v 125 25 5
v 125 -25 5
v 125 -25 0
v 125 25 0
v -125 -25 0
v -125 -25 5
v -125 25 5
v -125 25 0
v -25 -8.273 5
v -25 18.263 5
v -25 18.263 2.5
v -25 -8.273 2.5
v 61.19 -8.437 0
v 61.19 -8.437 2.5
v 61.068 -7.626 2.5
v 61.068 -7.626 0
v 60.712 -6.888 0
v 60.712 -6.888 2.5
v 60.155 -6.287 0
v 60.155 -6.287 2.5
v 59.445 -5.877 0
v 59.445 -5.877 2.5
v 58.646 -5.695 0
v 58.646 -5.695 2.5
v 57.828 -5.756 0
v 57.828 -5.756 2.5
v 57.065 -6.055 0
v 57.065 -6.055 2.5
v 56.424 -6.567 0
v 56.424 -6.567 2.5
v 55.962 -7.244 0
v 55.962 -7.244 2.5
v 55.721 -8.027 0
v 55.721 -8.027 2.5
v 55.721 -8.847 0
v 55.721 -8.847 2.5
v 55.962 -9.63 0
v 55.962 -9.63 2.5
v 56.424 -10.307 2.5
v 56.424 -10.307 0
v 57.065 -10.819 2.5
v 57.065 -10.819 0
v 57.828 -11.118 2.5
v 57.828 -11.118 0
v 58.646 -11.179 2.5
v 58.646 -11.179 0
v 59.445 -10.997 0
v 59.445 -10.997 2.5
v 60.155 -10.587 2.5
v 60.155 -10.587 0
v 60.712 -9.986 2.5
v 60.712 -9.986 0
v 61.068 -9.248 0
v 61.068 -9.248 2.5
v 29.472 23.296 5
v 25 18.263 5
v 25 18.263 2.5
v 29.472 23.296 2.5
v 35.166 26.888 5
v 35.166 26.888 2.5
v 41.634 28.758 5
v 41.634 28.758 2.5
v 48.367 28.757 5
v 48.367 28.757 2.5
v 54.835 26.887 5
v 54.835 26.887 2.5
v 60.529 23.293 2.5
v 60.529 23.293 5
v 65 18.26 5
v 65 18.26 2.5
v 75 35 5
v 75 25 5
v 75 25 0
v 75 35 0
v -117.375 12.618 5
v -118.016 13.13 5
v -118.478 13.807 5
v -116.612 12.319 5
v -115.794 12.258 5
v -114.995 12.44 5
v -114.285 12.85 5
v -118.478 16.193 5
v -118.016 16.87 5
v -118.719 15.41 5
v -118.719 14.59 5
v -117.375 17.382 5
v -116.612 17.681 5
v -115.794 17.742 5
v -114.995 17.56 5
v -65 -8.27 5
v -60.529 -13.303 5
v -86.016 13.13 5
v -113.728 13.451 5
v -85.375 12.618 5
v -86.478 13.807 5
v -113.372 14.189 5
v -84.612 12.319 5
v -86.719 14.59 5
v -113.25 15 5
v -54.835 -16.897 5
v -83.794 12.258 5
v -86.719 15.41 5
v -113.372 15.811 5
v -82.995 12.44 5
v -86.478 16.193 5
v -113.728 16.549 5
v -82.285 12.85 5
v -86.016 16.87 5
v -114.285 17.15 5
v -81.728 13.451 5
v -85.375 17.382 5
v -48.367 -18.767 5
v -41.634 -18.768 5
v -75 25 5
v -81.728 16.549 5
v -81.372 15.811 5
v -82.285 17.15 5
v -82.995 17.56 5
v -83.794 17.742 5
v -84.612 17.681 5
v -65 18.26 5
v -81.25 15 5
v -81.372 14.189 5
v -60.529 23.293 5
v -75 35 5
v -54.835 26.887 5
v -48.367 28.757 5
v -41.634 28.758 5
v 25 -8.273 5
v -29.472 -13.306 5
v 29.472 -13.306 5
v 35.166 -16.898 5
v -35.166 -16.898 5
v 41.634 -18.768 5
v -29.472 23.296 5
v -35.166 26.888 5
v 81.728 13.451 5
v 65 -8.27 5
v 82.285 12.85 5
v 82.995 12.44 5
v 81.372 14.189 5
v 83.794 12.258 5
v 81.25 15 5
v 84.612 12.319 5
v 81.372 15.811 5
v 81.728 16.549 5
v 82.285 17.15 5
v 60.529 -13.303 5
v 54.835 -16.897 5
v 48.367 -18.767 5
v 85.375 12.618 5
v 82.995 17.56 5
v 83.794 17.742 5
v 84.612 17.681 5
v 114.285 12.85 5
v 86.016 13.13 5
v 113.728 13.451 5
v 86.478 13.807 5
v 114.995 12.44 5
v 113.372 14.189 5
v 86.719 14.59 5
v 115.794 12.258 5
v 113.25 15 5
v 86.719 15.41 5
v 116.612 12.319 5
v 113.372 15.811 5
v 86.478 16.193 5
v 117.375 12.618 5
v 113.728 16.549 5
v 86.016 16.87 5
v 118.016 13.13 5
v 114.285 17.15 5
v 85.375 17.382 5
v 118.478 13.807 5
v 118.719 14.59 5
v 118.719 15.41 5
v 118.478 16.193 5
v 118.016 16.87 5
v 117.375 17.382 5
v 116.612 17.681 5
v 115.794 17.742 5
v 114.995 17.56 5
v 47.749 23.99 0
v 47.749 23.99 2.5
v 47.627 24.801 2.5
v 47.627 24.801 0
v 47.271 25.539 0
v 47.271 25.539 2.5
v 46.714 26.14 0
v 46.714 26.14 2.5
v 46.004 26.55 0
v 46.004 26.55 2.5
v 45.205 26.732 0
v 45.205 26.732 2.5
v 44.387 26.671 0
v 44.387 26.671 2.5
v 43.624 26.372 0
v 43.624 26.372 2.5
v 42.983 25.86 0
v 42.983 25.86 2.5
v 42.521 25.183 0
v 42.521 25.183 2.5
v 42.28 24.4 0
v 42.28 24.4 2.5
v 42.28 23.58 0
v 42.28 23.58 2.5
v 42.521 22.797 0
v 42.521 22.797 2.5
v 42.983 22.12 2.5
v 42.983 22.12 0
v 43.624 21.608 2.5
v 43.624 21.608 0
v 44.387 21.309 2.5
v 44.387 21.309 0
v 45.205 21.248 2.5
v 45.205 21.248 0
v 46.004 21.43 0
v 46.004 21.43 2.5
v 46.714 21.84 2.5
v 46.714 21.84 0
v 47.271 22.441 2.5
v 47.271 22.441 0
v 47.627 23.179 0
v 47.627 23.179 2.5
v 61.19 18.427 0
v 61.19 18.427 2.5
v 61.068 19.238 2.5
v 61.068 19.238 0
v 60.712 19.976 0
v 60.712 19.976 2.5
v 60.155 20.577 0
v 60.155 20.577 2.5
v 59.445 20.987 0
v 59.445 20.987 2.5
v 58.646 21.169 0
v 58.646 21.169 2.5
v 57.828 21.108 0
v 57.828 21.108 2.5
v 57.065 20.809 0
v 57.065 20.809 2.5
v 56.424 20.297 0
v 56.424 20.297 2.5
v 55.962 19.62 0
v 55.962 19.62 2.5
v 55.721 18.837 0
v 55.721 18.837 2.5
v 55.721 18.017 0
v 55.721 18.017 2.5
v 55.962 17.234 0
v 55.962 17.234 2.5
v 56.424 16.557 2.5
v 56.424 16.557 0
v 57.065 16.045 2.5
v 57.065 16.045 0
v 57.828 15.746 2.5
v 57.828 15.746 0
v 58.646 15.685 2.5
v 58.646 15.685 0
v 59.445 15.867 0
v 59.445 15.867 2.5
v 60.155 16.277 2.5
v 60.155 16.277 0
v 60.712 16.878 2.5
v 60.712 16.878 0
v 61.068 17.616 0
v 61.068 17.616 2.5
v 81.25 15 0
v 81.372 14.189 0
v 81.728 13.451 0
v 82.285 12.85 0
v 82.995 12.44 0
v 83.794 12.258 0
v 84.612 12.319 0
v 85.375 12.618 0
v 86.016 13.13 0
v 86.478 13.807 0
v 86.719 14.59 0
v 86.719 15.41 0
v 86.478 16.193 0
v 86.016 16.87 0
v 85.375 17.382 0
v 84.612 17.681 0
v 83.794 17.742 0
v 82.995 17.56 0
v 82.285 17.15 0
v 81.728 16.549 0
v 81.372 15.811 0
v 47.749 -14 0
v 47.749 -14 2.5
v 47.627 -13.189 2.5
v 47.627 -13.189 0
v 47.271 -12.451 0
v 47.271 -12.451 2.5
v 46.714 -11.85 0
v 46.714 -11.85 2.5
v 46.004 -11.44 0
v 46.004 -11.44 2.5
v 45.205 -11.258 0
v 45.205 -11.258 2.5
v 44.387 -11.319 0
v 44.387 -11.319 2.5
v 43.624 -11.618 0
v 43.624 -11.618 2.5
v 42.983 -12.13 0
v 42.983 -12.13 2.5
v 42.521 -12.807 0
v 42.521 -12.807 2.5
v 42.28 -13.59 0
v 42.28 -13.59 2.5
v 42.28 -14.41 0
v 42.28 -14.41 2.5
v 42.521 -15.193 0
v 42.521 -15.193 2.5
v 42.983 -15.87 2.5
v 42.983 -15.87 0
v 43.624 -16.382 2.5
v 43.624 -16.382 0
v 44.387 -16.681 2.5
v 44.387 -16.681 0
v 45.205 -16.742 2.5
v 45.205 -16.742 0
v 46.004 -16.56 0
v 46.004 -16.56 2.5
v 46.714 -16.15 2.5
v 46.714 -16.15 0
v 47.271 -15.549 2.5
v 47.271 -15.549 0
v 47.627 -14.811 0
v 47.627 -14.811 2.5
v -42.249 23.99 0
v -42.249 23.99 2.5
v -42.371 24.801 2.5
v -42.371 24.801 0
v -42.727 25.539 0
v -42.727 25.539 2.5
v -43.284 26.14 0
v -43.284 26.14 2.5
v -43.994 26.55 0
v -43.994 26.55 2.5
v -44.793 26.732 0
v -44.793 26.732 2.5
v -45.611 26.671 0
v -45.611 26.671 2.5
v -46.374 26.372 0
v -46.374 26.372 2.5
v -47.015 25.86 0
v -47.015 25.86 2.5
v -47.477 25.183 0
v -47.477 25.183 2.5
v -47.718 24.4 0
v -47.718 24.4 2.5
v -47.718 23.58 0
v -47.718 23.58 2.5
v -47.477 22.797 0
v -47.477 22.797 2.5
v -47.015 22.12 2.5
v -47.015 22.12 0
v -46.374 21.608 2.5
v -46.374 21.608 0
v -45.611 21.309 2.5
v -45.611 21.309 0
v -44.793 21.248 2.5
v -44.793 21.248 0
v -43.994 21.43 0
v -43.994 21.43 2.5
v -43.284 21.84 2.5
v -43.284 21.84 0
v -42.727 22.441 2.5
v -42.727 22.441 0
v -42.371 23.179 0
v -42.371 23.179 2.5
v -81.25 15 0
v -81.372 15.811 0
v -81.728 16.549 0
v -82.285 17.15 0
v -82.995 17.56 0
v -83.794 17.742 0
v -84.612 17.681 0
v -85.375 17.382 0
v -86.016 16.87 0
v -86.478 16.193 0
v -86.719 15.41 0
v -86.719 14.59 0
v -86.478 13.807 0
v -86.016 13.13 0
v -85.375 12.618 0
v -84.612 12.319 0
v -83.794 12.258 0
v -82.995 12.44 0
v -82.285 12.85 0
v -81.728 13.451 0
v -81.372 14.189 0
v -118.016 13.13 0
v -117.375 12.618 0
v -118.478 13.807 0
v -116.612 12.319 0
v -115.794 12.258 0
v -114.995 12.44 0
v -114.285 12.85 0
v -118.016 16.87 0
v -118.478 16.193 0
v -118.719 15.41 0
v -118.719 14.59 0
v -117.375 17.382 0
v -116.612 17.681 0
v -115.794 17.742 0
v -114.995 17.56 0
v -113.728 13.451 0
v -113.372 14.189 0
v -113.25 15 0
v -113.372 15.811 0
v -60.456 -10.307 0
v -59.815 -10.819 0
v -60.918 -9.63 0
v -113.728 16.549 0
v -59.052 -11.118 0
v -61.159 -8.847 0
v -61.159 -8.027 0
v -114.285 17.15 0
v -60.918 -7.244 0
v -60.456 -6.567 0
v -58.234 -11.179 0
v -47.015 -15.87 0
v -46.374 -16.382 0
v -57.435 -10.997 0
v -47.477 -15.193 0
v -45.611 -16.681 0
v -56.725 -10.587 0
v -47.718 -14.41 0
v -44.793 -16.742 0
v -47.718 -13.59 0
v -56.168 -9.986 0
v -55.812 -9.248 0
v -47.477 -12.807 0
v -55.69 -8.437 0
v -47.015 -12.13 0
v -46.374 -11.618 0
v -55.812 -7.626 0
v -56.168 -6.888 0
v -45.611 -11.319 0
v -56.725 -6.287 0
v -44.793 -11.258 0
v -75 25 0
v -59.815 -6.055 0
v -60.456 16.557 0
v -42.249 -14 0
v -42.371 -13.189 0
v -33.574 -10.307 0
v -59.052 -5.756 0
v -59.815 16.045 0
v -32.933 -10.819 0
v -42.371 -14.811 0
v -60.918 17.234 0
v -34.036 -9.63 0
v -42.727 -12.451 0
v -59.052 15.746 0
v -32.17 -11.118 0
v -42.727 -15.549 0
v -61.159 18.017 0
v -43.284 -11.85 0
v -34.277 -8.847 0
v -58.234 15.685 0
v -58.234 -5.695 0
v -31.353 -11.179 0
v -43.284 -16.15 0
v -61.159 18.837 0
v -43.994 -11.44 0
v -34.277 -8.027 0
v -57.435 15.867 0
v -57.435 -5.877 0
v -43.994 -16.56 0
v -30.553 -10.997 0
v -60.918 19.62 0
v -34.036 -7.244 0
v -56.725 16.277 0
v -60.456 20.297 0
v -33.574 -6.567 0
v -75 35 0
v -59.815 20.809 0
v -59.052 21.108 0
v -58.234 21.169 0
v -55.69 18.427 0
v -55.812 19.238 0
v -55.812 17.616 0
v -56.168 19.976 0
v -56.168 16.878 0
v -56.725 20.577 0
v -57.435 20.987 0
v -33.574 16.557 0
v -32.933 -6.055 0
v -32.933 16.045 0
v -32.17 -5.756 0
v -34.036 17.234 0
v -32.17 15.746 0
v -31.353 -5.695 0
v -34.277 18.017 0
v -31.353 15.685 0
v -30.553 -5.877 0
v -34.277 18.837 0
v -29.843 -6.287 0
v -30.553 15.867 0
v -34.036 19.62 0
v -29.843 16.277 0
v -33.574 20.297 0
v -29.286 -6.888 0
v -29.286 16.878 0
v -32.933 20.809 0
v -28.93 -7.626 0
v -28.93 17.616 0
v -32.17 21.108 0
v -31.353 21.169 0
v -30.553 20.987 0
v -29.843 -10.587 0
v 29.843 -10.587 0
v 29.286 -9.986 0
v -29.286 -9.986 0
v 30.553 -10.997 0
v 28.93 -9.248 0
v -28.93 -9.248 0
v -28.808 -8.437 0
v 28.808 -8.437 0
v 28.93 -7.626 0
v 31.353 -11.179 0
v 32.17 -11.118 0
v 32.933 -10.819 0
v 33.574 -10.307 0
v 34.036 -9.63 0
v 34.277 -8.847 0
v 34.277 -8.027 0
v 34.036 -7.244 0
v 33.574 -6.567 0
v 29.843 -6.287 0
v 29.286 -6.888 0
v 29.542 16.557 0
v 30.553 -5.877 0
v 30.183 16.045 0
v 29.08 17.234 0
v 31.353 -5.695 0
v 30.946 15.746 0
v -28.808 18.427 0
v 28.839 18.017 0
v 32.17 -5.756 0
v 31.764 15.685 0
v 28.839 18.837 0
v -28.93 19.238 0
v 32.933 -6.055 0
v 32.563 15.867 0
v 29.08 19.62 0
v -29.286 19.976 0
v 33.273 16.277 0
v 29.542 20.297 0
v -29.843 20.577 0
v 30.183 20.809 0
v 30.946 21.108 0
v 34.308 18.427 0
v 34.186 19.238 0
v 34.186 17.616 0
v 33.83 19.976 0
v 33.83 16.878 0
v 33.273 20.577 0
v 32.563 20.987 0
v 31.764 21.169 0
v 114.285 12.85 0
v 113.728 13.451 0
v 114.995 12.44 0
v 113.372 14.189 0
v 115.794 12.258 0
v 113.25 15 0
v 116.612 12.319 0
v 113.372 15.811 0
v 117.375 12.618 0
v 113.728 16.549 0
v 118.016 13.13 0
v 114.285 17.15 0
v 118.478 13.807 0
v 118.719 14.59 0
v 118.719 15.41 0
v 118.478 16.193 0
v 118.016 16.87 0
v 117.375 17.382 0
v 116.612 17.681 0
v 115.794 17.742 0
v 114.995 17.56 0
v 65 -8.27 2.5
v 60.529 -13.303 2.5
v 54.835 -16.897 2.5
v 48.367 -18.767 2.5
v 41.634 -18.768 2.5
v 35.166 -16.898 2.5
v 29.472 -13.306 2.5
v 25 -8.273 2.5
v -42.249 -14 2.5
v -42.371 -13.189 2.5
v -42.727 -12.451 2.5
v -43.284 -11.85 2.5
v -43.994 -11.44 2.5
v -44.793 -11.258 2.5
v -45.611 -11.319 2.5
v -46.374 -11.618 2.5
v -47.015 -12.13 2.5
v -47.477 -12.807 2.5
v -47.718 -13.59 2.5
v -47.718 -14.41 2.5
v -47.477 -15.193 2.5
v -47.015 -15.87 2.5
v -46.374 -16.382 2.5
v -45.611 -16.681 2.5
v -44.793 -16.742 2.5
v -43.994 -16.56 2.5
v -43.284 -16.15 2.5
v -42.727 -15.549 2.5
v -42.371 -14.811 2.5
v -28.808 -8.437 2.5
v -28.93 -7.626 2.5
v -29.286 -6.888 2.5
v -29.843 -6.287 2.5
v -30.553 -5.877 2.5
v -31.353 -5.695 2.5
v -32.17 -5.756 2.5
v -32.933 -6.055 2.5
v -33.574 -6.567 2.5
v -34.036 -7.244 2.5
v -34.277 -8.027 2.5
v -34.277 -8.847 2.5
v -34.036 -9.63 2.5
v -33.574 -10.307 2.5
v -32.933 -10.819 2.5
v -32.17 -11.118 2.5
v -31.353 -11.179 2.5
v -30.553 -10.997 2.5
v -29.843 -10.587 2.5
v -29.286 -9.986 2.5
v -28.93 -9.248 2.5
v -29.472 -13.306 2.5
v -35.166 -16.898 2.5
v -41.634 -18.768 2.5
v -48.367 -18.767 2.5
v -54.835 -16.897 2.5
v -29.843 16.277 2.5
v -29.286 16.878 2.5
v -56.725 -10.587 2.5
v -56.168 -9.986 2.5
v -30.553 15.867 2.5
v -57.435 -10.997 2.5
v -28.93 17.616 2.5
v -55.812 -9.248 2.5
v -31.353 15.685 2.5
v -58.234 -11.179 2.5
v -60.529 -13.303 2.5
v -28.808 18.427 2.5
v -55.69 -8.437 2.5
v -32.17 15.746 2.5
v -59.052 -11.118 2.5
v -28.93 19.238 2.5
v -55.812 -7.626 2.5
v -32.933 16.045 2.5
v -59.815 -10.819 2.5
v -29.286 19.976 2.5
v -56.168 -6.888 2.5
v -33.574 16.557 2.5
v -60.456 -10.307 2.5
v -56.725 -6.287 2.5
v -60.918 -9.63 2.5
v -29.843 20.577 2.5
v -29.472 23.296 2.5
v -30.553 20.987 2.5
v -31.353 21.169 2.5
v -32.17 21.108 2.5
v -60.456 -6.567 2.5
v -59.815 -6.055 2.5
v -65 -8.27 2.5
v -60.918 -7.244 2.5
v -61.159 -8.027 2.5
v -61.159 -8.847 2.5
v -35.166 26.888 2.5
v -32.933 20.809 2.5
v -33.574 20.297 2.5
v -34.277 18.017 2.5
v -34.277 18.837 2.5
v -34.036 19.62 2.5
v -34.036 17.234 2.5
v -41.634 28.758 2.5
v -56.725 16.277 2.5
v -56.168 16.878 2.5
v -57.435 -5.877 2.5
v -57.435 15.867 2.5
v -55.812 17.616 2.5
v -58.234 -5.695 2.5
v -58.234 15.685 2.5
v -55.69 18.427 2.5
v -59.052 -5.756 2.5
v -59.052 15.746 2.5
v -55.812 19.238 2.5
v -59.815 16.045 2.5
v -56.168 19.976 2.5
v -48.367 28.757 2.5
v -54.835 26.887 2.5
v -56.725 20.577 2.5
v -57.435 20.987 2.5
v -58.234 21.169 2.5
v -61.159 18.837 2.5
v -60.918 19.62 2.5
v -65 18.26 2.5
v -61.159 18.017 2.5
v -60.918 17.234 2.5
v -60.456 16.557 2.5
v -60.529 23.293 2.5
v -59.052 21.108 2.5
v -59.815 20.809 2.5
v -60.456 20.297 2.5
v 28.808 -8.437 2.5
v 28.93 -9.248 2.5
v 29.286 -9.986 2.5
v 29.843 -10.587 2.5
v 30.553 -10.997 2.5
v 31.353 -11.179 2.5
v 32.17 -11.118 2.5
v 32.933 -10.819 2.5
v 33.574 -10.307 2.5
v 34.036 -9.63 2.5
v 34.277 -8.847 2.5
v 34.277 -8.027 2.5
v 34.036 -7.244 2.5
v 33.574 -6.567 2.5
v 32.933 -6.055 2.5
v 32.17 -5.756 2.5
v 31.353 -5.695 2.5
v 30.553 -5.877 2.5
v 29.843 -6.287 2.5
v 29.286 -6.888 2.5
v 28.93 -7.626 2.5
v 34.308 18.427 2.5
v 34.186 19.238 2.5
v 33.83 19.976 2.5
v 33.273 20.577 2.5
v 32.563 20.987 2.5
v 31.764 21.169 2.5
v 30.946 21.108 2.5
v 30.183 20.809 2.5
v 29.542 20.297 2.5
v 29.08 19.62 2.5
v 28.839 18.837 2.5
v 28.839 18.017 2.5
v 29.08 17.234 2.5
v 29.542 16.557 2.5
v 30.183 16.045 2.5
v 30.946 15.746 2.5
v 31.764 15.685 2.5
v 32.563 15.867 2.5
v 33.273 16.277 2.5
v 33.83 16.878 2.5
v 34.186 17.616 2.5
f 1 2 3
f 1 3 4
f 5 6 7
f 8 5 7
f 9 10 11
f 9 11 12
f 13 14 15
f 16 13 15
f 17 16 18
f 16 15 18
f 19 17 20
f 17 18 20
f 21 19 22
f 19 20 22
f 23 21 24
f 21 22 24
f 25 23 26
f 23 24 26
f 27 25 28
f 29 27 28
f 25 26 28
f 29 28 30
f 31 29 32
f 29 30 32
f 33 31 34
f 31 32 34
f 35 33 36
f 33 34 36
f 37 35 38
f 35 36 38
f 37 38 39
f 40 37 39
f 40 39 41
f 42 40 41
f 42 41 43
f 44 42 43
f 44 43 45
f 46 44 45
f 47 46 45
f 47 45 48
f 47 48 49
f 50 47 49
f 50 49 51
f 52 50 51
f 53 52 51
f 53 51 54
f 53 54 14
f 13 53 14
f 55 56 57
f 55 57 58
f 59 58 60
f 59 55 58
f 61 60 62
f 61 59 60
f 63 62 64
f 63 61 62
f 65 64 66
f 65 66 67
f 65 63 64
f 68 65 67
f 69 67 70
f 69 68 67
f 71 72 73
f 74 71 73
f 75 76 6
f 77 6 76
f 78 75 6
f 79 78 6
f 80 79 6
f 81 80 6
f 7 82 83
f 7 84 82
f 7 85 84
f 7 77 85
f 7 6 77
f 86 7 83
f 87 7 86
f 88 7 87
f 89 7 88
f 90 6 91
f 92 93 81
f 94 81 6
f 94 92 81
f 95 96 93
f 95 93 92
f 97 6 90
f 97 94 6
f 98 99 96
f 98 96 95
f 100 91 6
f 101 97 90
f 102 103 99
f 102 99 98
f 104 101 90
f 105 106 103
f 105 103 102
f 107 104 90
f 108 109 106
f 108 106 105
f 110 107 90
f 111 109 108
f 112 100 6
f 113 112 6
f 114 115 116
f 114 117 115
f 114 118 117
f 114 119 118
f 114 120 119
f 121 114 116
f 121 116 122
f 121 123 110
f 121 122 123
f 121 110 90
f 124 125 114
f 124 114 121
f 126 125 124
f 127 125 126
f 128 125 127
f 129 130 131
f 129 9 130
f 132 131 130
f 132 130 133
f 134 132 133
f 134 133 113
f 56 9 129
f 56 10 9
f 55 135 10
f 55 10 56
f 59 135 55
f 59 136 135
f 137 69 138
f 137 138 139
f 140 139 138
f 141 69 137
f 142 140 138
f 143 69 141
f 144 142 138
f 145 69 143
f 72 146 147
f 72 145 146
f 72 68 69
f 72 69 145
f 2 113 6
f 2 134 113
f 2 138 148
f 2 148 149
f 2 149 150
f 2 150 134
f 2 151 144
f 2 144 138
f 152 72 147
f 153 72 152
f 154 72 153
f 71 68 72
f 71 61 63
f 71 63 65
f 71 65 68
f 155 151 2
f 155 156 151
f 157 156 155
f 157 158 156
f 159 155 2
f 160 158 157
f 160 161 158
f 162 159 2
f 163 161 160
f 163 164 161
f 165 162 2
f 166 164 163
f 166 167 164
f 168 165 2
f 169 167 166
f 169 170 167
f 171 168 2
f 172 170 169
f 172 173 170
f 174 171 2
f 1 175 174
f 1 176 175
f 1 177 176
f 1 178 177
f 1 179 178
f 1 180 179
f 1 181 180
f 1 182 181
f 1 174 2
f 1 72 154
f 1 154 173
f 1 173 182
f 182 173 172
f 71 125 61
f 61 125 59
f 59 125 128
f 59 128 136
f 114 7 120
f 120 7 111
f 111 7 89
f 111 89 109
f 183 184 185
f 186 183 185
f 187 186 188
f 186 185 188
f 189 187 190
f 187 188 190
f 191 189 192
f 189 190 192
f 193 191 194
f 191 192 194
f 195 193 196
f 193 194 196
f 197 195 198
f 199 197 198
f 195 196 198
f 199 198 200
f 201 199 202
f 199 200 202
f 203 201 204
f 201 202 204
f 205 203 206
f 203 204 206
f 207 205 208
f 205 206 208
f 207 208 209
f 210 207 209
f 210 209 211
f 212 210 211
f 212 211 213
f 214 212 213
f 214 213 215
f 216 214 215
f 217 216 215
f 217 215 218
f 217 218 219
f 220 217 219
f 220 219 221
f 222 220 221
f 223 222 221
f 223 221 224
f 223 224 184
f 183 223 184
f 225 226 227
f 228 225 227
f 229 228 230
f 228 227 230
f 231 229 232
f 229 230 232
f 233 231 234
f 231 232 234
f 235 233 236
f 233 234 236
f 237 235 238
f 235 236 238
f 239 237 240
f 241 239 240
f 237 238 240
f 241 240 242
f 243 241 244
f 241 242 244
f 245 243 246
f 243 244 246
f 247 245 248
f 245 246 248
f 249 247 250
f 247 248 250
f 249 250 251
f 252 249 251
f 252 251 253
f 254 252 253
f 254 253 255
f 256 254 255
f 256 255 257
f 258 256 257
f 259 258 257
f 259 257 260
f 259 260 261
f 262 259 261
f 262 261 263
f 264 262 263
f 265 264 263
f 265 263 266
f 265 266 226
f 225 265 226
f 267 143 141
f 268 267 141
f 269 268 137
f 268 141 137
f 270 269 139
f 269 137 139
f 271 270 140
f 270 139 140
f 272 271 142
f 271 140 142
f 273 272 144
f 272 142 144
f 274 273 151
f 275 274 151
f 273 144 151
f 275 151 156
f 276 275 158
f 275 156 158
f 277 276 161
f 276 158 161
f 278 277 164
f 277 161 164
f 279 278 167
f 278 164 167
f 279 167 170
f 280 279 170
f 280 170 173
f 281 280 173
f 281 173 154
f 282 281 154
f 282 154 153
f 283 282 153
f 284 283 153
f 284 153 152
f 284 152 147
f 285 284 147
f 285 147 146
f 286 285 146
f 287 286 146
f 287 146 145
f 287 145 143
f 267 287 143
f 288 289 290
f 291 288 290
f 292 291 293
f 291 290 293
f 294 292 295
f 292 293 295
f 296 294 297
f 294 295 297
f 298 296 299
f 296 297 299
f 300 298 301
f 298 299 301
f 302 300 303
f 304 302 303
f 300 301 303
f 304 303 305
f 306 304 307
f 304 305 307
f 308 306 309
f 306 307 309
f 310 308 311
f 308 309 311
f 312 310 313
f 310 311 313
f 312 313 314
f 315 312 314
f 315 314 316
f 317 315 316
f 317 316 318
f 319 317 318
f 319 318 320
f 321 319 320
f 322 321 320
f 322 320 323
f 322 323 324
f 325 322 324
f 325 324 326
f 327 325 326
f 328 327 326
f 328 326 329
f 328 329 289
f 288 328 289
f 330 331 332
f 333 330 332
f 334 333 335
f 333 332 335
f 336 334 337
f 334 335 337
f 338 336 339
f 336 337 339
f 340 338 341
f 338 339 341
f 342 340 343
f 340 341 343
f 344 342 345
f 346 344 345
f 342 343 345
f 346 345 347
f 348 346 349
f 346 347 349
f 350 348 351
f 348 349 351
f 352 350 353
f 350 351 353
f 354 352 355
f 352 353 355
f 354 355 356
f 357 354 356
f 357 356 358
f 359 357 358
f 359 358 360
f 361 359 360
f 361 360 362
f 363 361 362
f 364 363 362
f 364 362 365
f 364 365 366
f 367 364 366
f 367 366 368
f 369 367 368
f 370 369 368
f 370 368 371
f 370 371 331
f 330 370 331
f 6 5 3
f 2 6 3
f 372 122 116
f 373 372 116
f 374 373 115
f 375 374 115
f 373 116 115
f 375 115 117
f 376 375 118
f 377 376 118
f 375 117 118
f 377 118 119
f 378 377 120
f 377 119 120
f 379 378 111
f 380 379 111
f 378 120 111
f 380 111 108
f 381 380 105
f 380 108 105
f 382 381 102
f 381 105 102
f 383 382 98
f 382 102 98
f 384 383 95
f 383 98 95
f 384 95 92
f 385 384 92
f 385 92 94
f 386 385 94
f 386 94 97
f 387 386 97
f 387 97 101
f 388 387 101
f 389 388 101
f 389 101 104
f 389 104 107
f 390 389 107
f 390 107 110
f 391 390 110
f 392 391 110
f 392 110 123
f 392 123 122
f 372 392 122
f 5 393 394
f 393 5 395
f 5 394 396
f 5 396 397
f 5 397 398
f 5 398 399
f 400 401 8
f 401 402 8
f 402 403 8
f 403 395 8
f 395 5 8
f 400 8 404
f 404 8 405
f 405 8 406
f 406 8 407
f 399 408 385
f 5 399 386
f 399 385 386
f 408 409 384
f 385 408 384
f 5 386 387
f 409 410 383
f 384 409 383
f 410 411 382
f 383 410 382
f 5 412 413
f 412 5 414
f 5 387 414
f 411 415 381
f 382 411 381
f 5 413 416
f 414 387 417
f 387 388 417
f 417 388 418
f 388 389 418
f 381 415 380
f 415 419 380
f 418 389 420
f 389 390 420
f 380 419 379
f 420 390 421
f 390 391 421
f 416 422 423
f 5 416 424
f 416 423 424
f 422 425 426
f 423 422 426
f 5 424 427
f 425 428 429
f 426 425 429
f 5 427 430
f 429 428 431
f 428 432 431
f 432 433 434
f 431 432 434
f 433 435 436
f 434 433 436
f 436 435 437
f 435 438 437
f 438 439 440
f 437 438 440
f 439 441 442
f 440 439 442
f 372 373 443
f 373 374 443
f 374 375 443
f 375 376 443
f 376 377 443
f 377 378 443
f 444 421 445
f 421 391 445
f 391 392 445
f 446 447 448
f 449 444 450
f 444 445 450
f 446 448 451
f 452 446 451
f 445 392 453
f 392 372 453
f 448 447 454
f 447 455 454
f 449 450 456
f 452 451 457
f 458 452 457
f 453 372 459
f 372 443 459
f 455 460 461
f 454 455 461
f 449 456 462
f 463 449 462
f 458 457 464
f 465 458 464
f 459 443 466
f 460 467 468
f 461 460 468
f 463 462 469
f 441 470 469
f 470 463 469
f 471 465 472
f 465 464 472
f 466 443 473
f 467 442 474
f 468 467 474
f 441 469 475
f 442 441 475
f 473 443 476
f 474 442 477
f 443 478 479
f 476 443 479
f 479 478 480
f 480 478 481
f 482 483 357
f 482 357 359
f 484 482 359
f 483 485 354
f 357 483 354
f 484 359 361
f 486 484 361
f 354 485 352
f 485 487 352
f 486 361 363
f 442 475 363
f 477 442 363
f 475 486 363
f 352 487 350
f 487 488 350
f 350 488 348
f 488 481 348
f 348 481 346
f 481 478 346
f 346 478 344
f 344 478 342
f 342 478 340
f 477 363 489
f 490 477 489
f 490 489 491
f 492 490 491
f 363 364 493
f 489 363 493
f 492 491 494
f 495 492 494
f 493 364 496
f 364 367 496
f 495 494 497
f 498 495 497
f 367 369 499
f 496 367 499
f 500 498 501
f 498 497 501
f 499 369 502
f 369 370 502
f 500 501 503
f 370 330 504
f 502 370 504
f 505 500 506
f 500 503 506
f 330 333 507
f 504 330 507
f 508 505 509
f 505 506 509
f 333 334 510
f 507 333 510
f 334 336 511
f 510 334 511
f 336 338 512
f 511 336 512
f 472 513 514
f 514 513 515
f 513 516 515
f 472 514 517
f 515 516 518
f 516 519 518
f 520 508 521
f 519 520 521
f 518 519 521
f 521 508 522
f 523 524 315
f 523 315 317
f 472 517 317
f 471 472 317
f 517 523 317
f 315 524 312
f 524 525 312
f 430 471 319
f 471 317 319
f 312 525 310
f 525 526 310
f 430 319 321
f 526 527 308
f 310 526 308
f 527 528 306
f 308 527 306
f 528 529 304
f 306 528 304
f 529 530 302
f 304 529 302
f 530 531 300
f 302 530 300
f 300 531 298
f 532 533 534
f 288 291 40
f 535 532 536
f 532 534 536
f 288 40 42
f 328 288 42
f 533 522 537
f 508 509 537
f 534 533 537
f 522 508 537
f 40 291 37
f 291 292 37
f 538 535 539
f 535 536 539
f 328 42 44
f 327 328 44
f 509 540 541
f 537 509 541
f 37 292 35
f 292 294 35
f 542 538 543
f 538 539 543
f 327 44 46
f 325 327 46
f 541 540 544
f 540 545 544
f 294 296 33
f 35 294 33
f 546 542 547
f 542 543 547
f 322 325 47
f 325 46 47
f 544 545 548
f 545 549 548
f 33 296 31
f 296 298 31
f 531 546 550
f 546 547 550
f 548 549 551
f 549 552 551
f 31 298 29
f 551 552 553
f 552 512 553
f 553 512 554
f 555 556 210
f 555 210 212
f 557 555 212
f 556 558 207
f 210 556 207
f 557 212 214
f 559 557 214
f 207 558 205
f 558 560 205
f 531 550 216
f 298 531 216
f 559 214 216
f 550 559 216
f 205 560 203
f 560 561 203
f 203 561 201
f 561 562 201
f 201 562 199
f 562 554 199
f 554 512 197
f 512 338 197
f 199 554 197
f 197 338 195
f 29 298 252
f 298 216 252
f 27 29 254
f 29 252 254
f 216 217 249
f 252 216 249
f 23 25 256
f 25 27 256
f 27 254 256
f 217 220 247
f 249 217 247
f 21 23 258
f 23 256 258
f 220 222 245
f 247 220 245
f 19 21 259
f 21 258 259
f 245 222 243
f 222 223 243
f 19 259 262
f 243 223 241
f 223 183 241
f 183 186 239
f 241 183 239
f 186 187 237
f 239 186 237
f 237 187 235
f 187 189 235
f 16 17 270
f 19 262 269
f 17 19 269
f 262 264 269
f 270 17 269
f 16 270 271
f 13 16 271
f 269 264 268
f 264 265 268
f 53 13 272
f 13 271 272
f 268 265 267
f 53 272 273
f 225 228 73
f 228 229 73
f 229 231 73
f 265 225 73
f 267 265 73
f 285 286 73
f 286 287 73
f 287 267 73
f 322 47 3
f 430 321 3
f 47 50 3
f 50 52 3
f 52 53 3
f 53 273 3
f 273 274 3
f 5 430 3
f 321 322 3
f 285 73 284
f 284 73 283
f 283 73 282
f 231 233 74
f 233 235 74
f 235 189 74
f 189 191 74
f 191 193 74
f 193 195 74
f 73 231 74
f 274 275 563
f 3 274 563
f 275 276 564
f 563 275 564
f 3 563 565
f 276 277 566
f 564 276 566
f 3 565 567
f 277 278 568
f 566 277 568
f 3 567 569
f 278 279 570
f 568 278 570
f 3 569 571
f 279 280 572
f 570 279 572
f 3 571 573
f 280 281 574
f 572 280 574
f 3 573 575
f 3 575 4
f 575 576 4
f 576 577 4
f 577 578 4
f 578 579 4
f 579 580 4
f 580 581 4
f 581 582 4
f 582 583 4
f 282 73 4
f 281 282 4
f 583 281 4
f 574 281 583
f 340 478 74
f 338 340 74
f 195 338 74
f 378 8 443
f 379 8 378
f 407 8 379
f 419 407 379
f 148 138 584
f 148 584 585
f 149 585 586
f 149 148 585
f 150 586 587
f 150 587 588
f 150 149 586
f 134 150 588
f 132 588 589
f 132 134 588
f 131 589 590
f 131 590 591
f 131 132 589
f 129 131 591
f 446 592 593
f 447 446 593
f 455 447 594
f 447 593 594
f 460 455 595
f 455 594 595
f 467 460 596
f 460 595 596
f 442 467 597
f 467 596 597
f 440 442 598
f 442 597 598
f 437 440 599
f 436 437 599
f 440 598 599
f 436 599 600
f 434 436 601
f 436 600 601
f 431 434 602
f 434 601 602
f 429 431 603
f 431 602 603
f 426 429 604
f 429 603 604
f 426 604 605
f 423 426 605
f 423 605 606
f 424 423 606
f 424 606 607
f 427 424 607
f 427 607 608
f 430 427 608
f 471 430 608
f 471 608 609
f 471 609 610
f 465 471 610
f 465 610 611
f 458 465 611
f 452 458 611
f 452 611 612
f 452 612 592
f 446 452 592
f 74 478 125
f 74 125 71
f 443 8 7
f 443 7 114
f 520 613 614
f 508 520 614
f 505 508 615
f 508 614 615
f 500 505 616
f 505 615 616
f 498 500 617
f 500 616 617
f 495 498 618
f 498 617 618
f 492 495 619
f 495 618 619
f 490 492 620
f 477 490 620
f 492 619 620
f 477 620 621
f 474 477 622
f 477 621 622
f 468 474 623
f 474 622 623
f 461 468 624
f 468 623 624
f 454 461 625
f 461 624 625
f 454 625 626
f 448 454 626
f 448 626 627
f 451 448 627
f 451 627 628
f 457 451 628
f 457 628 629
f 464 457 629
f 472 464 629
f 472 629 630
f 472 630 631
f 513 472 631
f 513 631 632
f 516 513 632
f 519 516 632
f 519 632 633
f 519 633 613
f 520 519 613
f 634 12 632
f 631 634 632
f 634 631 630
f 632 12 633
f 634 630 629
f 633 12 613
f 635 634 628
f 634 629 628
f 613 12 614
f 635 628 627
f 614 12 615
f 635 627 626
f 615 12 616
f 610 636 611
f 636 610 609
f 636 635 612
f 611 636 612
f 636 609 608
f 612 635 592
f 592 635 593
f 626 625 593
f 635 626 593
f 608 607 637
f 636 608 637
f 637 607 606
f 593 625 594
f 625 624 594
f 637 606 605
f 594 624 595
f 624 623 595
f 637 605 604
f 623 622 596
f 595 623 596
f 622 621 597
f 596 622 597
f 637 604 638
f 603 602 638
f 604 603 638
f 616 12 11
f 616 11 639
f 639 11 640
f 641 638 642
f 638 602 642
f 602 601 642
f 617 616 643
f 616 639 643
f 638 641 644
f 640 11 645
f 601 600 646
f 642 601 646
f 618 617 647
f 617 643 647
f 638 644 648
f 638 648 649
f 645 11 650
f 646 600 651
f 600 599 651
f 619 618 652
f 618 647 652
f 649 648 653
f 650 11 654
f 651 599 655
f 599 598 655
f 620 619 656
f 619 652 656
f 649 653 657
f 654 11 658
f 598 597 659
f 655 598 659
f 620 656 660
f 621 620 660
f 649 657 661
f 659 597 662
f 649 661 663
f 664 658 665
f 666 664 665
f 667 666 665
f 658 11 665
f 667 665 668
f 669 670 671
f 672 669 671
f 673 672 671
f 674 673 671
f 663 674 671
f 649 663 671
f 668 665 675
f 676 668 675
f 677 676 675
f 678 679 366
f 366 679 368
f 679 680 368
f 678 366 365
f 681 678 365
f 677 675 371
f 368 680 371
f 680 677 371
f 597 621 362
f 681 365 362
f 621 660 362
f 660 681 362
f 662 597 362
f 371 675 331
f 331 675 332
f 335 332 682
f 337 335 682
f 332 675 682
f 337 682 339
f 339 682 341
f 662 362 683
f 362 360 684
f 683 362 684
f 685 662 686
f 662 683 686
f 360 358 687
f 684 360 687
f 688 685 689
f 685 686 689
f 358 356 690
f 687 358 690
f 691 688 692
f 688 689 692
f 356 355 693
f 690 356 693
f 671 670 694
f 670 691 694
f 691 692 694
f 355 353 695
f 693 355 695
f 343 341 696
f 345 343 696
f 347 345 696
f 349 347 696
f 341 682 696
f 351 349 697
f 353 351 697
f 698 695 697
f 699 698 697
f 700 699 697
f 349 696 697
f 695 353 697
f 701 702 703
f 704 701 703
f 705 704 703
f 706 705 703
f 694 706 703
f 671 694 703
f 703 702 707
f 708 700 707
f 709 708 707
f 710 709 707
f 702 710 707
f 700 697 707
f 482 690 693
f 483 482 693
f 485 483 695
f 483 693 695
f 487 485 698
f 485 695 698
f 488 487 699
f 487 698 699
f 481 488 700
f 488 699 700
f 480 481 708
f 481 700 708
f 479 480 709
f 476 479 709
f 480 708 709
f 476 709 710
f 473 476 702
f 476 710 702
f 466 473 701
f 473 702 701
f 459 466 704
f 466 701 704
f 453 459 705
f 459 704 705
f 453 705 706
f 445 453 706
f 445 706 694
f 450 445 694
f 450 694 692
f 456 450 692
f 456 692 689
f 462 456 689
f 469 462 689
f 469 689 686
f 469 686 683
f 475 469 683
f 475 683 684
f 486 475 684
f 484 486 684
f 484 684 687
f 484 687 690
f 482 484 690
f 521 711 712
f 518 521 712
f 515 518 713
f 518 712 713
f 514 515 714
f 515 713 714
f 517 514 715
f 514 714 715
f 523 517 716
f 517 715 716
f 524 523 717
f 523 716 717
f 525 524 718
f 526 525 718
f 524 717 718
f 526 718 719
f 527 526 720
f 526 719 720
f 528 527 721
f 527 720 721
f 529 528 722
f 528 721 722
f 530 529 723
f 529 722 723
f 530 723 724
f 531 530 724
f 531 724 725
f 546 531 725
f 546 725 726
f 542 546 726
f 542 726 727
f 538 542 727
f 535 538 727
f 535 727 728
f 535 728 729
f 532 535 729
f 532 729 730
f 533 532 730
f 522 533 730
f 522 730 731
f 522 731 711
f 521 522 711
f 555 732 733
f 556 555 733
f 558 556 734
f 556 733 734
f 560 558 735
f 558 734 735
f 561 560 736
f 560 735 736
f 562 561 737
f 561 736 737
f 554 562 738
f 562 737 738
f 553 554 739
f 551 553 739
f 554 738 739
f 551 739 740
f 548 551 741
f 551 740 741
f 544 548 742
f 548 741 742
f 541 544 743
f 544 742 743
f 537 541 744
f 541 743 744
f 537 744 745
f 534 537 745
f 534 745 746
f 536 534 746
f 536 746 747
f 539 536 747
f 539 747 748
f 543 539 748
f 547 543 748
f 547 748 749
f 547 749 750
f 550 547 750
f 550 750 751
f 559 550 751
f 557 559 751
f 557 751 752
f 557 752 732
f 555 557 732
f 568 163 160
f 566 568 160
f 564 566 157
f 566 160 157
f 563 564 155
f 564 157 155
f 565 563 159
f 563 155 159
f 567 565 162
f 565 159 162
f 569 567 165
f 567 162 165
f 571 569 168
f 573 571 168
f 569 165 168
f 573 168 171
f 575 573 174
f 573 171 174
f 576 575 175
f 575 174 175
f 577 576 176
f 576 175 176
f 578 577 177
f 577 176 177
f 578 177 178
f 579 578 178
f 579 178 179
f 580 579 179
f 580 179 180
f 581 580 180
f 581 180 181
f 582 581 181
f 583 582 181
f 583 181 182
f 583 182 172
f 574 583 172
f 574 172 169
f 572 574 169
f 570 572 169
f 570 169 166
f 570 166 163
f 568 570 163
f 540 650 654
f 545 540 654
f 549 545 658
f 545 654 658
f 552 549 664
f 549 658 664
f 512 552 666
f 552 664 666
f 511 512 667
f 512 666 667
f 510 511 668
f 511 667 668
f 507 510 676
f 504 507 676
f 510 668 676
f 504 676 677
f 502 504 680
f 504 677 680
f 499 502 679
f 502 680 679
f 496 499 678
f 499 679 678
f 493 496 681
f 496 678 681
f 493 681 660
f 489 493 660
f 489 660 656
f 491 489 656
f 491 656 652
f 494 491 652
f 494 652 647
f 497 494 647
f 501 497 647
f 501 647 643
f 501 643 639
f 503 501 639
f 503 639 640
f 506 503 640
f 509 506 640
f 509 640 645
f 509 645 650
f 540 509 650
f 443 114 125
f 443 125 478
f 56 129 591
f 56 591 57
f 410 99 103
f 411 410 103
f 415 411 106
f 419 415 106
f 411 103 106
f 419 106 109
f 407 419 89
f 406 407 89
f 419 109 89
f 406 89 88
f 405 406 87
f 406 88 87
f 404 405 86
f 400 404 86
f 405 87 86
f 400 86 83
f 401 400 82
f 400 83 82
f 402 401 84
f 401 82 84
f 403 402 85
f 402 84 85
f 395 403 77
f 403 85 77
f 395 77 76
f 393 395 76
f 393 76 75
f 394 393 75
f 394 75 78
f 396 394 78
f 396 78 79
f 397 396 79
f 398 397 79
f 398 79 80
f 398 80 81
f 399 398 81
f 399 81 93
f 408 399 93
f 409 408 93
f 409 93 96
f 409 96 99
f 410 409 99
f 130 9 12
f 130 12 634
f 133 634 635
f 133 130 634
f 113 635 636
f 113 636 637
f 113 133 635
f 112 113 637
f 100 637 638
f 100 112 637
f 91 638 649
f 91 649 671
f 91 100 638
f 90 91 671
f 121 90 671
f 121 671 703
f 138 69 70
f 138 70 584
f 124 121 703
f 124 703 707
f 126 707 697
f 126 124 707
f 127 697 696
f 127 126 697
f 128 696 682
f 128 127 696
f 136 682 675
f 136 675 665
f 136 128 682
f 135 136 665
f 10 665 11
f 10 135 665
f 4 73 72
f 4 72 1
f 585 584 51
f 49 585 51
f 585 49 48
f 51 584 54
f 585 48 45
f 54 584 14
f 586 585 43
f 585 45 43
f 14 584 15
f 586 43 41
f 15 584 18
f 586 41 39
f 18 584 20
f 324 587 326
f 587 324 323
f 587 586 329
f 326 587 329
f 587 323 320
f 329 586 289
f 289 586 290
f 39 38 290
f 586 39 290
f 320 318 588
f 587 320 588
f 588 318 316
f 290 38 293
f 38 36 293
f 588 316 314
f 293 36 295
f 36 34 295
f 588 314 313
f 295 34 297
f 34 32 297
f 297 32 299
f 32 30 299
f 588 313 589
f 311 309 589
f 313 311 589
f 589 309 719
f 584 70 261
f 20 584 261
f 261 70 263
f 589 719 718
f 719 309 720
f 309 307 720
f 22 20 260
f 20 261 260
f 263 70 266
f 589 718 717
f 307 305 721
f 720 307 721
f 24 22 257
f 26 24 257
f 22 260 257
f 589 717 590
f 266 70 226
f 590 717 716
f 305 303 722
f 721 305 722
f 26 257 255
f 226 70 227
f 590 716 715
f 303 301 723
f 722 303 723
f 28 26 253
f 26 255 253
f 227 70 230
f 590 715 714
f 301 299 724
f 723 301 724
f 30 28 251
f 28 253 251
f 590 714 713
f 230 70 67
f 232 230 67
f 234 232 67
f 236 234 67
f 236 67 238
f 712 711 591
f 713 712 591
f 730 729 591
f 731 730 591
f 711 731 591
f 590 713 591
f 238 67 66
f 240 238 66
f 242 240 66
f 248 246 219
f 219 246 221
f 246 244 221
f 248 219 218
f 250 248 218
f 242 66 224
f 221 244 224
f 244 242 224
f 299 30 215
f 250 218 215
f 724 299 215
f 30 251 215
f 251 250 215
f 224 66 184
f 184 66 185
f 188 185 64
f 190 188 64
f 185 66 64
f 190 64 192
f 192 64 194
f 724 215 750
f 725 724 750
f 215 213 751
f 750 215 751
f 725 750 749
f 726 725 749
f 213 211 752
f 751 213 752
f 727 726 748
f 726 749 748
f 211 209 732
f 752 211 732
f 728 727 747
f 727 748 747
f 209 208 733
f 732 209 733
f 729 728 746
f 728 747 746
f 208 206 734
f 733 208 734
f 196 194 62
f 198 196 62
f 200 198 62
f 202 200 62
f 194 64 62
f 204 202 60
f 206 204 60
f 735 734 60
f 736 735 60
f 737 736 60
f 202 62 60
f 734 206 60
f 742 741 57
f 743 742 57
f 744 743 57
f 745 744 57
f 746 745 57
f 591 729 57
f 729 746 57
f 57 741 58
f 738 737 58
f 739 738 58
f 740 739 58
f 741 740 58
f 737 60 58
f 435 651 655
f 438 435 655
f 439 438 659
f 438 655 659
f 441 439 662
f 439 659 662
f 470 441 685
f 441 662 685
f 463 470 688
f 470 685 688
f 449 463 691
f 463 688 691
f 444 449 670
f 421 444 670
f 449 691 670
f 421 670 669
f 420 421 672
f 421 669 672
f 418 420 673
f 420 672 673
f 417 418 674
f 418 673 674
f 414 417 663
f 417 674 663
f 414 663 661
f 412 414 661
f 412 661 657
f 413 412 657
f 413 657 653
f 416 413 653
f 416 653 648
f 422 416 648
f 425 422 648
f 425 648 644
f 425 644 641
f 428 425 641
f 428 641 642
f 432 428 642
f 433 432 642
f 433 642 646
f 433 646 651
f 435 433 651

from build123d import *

# Parameters (mm, degrees)
SKETCH_1_W          = 290
SKETCH_1_H          = 50
EXTRUDE_1_DEPTH     = 5
SKETCH_3_W          = 20
SKETCH_3_H          = 50
CUT_EXTRUDE_1_DEPTH = 10
SKETCH_4_W          = 150
SKETCH_4_H          = 5
EXTRUDE_2_DEPTH     = 10
SKETCH_2_R          = 2.75
CUT_EXTRUDE_2_DEPTH = 2.5
SKETCH_2_2_R        = 2.75
CUT_EXTRUDE_3_DEPTH = 130.903810568
SKETCH_5_R          = 2.75
CUT_EXTRUDE_4_DEPTH = 130.903810568


with BuildPart() as part:
    # 스케치1 → 보스-돌출1 (new body)
    with BuildSketch(Plane.XY):
        Rectangle(SKETCH_1_W, SKETCH_1_H)
    extrude(amount=EXTRUDE_1_DEPTH)

    # 스케치3 → 컷-돌출1 (cut)
    with BuildSketch(Plane.XY.offset(5)):
        with Locations((-135, 0)):
            Rectangle(SKETCH_3_W, SKETCH_3_H)
    cut_extrude_1 = extrude(amount=-CUT_EXTRUDE_1_DEPTH, mode=Mode.SUBTRACT)

    # 대칭 복사1: 컷-돌출1 across plane
    add(cut_extrude_1.mirror(Plane(origin=(0, 0, 0), x_dir=(0, 0, 1), z_dir=(1, 0, 0))), mode=Mode.SUBTRACT)

    # 스케치4 → 보스-돌출2 (add)
    with BuildSketch(Plane(origin=(0, 25, 0), x_dir=(1, 0, 0), z_dir=(0, 1, 0))):
        with Locations((0, -2.5)):
            Rectangle(SKETCH_4_W, SKETCH_4_H)
    extrude(amount=EXTRUDE_2_DEPTH)

    # 스케치2 → 컷-돌출2 (cut)
    # profile 1 of 2: a face of its own
    with BuildSketch(Plane.XY.offset(5)):
        with BuildLine():
            Line((65, 18.26), (65, -8.27))
            ThreePointArc((65, -8.27), (45.000804497, -19.004999933), (25, -8.272998079))
            Line((25, -8.272998079), (25, 18.262998079))
            ThreePointArc((25, 18.262998079), (45.000804497, 28.994999933), (65, 18.26))
        make_face()
        with Locations((58.44, -8.437)):
            Circle(SKETCH_2_R, mode=Mode.SUBTRACT)
        with Locations((31.558011299, -8.437)):
            Circle(SKETCH_2_R, mode=Mode.SUBTRACT)
        with Locations((44.99900565, -14)):
            Circle(SKETCH_2_R, mode=Mode.SUBTRACT)
        with Locations((58.44, 18.427)):
            Circle(SKETCH_2_R, mode=Mode.SUBTRACT)
        with Locations((44.99900565, 23.99)):
            Circle(SKETCH_2_R, mode=Mode.SUBTRACT)
        with Locations((31.558011299, 18.427)):
            Circle(SKETCH_2_R, mode=Mode.SUBTRACT)
    # profile 2 of 2: a face of its own
    with BuildSketch(Plane.XY.offset(5)):
        with BuildLine():
            Line((-25, 18.262998079), (-25, -8.272998079))
            ThreePointArc((-25, -8.272998079), (-45.000804497, -19.004999933), (-65, -8.27))
            Line((-65, -8.27), (-65, 18.26))
            ThreePointArc((-65, 18.26), (-45.000804497, 28.994999933), (-25, 18.262998079))
        make_face()
        with Locations((-31.558011299, 18.427)):
            Circle(SKETCH_2_R, mode=Mode.SUBTRACT)
        with Locations((-44.99900565, 23.99)):
            Circle(SKETCH_2_R, mode=Mode.SUBTRACT)
        with Locations((-58.44, 18.427)):
            Circle(SKETCH_2_R, mode=Mode.SUBTRACT)
        with Locations((-44.99900565, -14)):
            Circle(SKETCH_2_R, mode=Mode.SUBTRACT)
        with Locations((-31.558011299, -8.437)):
            Circle(SKETCH_2_R, mode=Mode.SUBTRACT)
        with Locations((-58.44, -8.437)):
            Circle(SKETCH_2_R, mode=Mode.SUBTRACT)
    extrude(amount=-CUT_EXTRUDE_2_DEPTH, mode=Mode.SUBTRACT)

    # 스케치2<2> → 컷-돌출3 (cut, through all)
    with BuildSketch(Plane.XY.offset(5)):
        with Locations((58.44, -8.437)):
            Circle(SKETCH_2_2_R)
        with Locations((31.558011299, -8.437)):
            Circle(SKETCH_2_2_R)
        with Locations((44.99900565, -14)):
            Circle(SKETCH_2_2_R)
        with Locations((58.44, 18.427)):
            Circle(SKETCH_2_2_R)
        with Locations((44.99900565, 23.99)):
            Circle(SKETCH_2_2_R)
        with Locations((31.558011299, 18.427)):
            Circle(SKETCH_2_2_R)
        with Locations((-31.558011299, 18.427)):
            Circle(SKETCH_2_2_R)
        with Locations((-44.99900565, 23.99)):
            Circle(SKETCH_2_2_R)
        with Locations((-58.44, 18.427)):
            Circle(SKETCH_2_2_R)
        with Locations((-44.99900565, -14)):
            Circle(SKETCH_2_2_R)
        with Locations((-31.558011299, -8.437)):
            Circle(SKETCH_2_2_R)
        with Locations((-58.44, -8.437)):
            Circle(SKETCH_2_2_R)
    extrude(amount=-CUT_EXTRUDE_3_DEPTH, mode=Mode.SUBTRACT)

    # 스케치5 → 컷-돌출4 (cut, through all)
    with BuildSketch(Plane.XY.offset(5)):
        with Locations((-84, 15)):
            Circle(SKETCH_5_R)
        with Locations((-116, 15)):
            Circle(SKETCH_5_R)
        with Locations((116, 15)):
            Circle(SKETCH_5_R)
        with Locations((84, 15)):
            Circle(SKETCH_5_R)
    extrude(amount=-CUT_EXTRUDE_4_DEPTH, mode=Mode.SUBTRACT)


solid = part.part
